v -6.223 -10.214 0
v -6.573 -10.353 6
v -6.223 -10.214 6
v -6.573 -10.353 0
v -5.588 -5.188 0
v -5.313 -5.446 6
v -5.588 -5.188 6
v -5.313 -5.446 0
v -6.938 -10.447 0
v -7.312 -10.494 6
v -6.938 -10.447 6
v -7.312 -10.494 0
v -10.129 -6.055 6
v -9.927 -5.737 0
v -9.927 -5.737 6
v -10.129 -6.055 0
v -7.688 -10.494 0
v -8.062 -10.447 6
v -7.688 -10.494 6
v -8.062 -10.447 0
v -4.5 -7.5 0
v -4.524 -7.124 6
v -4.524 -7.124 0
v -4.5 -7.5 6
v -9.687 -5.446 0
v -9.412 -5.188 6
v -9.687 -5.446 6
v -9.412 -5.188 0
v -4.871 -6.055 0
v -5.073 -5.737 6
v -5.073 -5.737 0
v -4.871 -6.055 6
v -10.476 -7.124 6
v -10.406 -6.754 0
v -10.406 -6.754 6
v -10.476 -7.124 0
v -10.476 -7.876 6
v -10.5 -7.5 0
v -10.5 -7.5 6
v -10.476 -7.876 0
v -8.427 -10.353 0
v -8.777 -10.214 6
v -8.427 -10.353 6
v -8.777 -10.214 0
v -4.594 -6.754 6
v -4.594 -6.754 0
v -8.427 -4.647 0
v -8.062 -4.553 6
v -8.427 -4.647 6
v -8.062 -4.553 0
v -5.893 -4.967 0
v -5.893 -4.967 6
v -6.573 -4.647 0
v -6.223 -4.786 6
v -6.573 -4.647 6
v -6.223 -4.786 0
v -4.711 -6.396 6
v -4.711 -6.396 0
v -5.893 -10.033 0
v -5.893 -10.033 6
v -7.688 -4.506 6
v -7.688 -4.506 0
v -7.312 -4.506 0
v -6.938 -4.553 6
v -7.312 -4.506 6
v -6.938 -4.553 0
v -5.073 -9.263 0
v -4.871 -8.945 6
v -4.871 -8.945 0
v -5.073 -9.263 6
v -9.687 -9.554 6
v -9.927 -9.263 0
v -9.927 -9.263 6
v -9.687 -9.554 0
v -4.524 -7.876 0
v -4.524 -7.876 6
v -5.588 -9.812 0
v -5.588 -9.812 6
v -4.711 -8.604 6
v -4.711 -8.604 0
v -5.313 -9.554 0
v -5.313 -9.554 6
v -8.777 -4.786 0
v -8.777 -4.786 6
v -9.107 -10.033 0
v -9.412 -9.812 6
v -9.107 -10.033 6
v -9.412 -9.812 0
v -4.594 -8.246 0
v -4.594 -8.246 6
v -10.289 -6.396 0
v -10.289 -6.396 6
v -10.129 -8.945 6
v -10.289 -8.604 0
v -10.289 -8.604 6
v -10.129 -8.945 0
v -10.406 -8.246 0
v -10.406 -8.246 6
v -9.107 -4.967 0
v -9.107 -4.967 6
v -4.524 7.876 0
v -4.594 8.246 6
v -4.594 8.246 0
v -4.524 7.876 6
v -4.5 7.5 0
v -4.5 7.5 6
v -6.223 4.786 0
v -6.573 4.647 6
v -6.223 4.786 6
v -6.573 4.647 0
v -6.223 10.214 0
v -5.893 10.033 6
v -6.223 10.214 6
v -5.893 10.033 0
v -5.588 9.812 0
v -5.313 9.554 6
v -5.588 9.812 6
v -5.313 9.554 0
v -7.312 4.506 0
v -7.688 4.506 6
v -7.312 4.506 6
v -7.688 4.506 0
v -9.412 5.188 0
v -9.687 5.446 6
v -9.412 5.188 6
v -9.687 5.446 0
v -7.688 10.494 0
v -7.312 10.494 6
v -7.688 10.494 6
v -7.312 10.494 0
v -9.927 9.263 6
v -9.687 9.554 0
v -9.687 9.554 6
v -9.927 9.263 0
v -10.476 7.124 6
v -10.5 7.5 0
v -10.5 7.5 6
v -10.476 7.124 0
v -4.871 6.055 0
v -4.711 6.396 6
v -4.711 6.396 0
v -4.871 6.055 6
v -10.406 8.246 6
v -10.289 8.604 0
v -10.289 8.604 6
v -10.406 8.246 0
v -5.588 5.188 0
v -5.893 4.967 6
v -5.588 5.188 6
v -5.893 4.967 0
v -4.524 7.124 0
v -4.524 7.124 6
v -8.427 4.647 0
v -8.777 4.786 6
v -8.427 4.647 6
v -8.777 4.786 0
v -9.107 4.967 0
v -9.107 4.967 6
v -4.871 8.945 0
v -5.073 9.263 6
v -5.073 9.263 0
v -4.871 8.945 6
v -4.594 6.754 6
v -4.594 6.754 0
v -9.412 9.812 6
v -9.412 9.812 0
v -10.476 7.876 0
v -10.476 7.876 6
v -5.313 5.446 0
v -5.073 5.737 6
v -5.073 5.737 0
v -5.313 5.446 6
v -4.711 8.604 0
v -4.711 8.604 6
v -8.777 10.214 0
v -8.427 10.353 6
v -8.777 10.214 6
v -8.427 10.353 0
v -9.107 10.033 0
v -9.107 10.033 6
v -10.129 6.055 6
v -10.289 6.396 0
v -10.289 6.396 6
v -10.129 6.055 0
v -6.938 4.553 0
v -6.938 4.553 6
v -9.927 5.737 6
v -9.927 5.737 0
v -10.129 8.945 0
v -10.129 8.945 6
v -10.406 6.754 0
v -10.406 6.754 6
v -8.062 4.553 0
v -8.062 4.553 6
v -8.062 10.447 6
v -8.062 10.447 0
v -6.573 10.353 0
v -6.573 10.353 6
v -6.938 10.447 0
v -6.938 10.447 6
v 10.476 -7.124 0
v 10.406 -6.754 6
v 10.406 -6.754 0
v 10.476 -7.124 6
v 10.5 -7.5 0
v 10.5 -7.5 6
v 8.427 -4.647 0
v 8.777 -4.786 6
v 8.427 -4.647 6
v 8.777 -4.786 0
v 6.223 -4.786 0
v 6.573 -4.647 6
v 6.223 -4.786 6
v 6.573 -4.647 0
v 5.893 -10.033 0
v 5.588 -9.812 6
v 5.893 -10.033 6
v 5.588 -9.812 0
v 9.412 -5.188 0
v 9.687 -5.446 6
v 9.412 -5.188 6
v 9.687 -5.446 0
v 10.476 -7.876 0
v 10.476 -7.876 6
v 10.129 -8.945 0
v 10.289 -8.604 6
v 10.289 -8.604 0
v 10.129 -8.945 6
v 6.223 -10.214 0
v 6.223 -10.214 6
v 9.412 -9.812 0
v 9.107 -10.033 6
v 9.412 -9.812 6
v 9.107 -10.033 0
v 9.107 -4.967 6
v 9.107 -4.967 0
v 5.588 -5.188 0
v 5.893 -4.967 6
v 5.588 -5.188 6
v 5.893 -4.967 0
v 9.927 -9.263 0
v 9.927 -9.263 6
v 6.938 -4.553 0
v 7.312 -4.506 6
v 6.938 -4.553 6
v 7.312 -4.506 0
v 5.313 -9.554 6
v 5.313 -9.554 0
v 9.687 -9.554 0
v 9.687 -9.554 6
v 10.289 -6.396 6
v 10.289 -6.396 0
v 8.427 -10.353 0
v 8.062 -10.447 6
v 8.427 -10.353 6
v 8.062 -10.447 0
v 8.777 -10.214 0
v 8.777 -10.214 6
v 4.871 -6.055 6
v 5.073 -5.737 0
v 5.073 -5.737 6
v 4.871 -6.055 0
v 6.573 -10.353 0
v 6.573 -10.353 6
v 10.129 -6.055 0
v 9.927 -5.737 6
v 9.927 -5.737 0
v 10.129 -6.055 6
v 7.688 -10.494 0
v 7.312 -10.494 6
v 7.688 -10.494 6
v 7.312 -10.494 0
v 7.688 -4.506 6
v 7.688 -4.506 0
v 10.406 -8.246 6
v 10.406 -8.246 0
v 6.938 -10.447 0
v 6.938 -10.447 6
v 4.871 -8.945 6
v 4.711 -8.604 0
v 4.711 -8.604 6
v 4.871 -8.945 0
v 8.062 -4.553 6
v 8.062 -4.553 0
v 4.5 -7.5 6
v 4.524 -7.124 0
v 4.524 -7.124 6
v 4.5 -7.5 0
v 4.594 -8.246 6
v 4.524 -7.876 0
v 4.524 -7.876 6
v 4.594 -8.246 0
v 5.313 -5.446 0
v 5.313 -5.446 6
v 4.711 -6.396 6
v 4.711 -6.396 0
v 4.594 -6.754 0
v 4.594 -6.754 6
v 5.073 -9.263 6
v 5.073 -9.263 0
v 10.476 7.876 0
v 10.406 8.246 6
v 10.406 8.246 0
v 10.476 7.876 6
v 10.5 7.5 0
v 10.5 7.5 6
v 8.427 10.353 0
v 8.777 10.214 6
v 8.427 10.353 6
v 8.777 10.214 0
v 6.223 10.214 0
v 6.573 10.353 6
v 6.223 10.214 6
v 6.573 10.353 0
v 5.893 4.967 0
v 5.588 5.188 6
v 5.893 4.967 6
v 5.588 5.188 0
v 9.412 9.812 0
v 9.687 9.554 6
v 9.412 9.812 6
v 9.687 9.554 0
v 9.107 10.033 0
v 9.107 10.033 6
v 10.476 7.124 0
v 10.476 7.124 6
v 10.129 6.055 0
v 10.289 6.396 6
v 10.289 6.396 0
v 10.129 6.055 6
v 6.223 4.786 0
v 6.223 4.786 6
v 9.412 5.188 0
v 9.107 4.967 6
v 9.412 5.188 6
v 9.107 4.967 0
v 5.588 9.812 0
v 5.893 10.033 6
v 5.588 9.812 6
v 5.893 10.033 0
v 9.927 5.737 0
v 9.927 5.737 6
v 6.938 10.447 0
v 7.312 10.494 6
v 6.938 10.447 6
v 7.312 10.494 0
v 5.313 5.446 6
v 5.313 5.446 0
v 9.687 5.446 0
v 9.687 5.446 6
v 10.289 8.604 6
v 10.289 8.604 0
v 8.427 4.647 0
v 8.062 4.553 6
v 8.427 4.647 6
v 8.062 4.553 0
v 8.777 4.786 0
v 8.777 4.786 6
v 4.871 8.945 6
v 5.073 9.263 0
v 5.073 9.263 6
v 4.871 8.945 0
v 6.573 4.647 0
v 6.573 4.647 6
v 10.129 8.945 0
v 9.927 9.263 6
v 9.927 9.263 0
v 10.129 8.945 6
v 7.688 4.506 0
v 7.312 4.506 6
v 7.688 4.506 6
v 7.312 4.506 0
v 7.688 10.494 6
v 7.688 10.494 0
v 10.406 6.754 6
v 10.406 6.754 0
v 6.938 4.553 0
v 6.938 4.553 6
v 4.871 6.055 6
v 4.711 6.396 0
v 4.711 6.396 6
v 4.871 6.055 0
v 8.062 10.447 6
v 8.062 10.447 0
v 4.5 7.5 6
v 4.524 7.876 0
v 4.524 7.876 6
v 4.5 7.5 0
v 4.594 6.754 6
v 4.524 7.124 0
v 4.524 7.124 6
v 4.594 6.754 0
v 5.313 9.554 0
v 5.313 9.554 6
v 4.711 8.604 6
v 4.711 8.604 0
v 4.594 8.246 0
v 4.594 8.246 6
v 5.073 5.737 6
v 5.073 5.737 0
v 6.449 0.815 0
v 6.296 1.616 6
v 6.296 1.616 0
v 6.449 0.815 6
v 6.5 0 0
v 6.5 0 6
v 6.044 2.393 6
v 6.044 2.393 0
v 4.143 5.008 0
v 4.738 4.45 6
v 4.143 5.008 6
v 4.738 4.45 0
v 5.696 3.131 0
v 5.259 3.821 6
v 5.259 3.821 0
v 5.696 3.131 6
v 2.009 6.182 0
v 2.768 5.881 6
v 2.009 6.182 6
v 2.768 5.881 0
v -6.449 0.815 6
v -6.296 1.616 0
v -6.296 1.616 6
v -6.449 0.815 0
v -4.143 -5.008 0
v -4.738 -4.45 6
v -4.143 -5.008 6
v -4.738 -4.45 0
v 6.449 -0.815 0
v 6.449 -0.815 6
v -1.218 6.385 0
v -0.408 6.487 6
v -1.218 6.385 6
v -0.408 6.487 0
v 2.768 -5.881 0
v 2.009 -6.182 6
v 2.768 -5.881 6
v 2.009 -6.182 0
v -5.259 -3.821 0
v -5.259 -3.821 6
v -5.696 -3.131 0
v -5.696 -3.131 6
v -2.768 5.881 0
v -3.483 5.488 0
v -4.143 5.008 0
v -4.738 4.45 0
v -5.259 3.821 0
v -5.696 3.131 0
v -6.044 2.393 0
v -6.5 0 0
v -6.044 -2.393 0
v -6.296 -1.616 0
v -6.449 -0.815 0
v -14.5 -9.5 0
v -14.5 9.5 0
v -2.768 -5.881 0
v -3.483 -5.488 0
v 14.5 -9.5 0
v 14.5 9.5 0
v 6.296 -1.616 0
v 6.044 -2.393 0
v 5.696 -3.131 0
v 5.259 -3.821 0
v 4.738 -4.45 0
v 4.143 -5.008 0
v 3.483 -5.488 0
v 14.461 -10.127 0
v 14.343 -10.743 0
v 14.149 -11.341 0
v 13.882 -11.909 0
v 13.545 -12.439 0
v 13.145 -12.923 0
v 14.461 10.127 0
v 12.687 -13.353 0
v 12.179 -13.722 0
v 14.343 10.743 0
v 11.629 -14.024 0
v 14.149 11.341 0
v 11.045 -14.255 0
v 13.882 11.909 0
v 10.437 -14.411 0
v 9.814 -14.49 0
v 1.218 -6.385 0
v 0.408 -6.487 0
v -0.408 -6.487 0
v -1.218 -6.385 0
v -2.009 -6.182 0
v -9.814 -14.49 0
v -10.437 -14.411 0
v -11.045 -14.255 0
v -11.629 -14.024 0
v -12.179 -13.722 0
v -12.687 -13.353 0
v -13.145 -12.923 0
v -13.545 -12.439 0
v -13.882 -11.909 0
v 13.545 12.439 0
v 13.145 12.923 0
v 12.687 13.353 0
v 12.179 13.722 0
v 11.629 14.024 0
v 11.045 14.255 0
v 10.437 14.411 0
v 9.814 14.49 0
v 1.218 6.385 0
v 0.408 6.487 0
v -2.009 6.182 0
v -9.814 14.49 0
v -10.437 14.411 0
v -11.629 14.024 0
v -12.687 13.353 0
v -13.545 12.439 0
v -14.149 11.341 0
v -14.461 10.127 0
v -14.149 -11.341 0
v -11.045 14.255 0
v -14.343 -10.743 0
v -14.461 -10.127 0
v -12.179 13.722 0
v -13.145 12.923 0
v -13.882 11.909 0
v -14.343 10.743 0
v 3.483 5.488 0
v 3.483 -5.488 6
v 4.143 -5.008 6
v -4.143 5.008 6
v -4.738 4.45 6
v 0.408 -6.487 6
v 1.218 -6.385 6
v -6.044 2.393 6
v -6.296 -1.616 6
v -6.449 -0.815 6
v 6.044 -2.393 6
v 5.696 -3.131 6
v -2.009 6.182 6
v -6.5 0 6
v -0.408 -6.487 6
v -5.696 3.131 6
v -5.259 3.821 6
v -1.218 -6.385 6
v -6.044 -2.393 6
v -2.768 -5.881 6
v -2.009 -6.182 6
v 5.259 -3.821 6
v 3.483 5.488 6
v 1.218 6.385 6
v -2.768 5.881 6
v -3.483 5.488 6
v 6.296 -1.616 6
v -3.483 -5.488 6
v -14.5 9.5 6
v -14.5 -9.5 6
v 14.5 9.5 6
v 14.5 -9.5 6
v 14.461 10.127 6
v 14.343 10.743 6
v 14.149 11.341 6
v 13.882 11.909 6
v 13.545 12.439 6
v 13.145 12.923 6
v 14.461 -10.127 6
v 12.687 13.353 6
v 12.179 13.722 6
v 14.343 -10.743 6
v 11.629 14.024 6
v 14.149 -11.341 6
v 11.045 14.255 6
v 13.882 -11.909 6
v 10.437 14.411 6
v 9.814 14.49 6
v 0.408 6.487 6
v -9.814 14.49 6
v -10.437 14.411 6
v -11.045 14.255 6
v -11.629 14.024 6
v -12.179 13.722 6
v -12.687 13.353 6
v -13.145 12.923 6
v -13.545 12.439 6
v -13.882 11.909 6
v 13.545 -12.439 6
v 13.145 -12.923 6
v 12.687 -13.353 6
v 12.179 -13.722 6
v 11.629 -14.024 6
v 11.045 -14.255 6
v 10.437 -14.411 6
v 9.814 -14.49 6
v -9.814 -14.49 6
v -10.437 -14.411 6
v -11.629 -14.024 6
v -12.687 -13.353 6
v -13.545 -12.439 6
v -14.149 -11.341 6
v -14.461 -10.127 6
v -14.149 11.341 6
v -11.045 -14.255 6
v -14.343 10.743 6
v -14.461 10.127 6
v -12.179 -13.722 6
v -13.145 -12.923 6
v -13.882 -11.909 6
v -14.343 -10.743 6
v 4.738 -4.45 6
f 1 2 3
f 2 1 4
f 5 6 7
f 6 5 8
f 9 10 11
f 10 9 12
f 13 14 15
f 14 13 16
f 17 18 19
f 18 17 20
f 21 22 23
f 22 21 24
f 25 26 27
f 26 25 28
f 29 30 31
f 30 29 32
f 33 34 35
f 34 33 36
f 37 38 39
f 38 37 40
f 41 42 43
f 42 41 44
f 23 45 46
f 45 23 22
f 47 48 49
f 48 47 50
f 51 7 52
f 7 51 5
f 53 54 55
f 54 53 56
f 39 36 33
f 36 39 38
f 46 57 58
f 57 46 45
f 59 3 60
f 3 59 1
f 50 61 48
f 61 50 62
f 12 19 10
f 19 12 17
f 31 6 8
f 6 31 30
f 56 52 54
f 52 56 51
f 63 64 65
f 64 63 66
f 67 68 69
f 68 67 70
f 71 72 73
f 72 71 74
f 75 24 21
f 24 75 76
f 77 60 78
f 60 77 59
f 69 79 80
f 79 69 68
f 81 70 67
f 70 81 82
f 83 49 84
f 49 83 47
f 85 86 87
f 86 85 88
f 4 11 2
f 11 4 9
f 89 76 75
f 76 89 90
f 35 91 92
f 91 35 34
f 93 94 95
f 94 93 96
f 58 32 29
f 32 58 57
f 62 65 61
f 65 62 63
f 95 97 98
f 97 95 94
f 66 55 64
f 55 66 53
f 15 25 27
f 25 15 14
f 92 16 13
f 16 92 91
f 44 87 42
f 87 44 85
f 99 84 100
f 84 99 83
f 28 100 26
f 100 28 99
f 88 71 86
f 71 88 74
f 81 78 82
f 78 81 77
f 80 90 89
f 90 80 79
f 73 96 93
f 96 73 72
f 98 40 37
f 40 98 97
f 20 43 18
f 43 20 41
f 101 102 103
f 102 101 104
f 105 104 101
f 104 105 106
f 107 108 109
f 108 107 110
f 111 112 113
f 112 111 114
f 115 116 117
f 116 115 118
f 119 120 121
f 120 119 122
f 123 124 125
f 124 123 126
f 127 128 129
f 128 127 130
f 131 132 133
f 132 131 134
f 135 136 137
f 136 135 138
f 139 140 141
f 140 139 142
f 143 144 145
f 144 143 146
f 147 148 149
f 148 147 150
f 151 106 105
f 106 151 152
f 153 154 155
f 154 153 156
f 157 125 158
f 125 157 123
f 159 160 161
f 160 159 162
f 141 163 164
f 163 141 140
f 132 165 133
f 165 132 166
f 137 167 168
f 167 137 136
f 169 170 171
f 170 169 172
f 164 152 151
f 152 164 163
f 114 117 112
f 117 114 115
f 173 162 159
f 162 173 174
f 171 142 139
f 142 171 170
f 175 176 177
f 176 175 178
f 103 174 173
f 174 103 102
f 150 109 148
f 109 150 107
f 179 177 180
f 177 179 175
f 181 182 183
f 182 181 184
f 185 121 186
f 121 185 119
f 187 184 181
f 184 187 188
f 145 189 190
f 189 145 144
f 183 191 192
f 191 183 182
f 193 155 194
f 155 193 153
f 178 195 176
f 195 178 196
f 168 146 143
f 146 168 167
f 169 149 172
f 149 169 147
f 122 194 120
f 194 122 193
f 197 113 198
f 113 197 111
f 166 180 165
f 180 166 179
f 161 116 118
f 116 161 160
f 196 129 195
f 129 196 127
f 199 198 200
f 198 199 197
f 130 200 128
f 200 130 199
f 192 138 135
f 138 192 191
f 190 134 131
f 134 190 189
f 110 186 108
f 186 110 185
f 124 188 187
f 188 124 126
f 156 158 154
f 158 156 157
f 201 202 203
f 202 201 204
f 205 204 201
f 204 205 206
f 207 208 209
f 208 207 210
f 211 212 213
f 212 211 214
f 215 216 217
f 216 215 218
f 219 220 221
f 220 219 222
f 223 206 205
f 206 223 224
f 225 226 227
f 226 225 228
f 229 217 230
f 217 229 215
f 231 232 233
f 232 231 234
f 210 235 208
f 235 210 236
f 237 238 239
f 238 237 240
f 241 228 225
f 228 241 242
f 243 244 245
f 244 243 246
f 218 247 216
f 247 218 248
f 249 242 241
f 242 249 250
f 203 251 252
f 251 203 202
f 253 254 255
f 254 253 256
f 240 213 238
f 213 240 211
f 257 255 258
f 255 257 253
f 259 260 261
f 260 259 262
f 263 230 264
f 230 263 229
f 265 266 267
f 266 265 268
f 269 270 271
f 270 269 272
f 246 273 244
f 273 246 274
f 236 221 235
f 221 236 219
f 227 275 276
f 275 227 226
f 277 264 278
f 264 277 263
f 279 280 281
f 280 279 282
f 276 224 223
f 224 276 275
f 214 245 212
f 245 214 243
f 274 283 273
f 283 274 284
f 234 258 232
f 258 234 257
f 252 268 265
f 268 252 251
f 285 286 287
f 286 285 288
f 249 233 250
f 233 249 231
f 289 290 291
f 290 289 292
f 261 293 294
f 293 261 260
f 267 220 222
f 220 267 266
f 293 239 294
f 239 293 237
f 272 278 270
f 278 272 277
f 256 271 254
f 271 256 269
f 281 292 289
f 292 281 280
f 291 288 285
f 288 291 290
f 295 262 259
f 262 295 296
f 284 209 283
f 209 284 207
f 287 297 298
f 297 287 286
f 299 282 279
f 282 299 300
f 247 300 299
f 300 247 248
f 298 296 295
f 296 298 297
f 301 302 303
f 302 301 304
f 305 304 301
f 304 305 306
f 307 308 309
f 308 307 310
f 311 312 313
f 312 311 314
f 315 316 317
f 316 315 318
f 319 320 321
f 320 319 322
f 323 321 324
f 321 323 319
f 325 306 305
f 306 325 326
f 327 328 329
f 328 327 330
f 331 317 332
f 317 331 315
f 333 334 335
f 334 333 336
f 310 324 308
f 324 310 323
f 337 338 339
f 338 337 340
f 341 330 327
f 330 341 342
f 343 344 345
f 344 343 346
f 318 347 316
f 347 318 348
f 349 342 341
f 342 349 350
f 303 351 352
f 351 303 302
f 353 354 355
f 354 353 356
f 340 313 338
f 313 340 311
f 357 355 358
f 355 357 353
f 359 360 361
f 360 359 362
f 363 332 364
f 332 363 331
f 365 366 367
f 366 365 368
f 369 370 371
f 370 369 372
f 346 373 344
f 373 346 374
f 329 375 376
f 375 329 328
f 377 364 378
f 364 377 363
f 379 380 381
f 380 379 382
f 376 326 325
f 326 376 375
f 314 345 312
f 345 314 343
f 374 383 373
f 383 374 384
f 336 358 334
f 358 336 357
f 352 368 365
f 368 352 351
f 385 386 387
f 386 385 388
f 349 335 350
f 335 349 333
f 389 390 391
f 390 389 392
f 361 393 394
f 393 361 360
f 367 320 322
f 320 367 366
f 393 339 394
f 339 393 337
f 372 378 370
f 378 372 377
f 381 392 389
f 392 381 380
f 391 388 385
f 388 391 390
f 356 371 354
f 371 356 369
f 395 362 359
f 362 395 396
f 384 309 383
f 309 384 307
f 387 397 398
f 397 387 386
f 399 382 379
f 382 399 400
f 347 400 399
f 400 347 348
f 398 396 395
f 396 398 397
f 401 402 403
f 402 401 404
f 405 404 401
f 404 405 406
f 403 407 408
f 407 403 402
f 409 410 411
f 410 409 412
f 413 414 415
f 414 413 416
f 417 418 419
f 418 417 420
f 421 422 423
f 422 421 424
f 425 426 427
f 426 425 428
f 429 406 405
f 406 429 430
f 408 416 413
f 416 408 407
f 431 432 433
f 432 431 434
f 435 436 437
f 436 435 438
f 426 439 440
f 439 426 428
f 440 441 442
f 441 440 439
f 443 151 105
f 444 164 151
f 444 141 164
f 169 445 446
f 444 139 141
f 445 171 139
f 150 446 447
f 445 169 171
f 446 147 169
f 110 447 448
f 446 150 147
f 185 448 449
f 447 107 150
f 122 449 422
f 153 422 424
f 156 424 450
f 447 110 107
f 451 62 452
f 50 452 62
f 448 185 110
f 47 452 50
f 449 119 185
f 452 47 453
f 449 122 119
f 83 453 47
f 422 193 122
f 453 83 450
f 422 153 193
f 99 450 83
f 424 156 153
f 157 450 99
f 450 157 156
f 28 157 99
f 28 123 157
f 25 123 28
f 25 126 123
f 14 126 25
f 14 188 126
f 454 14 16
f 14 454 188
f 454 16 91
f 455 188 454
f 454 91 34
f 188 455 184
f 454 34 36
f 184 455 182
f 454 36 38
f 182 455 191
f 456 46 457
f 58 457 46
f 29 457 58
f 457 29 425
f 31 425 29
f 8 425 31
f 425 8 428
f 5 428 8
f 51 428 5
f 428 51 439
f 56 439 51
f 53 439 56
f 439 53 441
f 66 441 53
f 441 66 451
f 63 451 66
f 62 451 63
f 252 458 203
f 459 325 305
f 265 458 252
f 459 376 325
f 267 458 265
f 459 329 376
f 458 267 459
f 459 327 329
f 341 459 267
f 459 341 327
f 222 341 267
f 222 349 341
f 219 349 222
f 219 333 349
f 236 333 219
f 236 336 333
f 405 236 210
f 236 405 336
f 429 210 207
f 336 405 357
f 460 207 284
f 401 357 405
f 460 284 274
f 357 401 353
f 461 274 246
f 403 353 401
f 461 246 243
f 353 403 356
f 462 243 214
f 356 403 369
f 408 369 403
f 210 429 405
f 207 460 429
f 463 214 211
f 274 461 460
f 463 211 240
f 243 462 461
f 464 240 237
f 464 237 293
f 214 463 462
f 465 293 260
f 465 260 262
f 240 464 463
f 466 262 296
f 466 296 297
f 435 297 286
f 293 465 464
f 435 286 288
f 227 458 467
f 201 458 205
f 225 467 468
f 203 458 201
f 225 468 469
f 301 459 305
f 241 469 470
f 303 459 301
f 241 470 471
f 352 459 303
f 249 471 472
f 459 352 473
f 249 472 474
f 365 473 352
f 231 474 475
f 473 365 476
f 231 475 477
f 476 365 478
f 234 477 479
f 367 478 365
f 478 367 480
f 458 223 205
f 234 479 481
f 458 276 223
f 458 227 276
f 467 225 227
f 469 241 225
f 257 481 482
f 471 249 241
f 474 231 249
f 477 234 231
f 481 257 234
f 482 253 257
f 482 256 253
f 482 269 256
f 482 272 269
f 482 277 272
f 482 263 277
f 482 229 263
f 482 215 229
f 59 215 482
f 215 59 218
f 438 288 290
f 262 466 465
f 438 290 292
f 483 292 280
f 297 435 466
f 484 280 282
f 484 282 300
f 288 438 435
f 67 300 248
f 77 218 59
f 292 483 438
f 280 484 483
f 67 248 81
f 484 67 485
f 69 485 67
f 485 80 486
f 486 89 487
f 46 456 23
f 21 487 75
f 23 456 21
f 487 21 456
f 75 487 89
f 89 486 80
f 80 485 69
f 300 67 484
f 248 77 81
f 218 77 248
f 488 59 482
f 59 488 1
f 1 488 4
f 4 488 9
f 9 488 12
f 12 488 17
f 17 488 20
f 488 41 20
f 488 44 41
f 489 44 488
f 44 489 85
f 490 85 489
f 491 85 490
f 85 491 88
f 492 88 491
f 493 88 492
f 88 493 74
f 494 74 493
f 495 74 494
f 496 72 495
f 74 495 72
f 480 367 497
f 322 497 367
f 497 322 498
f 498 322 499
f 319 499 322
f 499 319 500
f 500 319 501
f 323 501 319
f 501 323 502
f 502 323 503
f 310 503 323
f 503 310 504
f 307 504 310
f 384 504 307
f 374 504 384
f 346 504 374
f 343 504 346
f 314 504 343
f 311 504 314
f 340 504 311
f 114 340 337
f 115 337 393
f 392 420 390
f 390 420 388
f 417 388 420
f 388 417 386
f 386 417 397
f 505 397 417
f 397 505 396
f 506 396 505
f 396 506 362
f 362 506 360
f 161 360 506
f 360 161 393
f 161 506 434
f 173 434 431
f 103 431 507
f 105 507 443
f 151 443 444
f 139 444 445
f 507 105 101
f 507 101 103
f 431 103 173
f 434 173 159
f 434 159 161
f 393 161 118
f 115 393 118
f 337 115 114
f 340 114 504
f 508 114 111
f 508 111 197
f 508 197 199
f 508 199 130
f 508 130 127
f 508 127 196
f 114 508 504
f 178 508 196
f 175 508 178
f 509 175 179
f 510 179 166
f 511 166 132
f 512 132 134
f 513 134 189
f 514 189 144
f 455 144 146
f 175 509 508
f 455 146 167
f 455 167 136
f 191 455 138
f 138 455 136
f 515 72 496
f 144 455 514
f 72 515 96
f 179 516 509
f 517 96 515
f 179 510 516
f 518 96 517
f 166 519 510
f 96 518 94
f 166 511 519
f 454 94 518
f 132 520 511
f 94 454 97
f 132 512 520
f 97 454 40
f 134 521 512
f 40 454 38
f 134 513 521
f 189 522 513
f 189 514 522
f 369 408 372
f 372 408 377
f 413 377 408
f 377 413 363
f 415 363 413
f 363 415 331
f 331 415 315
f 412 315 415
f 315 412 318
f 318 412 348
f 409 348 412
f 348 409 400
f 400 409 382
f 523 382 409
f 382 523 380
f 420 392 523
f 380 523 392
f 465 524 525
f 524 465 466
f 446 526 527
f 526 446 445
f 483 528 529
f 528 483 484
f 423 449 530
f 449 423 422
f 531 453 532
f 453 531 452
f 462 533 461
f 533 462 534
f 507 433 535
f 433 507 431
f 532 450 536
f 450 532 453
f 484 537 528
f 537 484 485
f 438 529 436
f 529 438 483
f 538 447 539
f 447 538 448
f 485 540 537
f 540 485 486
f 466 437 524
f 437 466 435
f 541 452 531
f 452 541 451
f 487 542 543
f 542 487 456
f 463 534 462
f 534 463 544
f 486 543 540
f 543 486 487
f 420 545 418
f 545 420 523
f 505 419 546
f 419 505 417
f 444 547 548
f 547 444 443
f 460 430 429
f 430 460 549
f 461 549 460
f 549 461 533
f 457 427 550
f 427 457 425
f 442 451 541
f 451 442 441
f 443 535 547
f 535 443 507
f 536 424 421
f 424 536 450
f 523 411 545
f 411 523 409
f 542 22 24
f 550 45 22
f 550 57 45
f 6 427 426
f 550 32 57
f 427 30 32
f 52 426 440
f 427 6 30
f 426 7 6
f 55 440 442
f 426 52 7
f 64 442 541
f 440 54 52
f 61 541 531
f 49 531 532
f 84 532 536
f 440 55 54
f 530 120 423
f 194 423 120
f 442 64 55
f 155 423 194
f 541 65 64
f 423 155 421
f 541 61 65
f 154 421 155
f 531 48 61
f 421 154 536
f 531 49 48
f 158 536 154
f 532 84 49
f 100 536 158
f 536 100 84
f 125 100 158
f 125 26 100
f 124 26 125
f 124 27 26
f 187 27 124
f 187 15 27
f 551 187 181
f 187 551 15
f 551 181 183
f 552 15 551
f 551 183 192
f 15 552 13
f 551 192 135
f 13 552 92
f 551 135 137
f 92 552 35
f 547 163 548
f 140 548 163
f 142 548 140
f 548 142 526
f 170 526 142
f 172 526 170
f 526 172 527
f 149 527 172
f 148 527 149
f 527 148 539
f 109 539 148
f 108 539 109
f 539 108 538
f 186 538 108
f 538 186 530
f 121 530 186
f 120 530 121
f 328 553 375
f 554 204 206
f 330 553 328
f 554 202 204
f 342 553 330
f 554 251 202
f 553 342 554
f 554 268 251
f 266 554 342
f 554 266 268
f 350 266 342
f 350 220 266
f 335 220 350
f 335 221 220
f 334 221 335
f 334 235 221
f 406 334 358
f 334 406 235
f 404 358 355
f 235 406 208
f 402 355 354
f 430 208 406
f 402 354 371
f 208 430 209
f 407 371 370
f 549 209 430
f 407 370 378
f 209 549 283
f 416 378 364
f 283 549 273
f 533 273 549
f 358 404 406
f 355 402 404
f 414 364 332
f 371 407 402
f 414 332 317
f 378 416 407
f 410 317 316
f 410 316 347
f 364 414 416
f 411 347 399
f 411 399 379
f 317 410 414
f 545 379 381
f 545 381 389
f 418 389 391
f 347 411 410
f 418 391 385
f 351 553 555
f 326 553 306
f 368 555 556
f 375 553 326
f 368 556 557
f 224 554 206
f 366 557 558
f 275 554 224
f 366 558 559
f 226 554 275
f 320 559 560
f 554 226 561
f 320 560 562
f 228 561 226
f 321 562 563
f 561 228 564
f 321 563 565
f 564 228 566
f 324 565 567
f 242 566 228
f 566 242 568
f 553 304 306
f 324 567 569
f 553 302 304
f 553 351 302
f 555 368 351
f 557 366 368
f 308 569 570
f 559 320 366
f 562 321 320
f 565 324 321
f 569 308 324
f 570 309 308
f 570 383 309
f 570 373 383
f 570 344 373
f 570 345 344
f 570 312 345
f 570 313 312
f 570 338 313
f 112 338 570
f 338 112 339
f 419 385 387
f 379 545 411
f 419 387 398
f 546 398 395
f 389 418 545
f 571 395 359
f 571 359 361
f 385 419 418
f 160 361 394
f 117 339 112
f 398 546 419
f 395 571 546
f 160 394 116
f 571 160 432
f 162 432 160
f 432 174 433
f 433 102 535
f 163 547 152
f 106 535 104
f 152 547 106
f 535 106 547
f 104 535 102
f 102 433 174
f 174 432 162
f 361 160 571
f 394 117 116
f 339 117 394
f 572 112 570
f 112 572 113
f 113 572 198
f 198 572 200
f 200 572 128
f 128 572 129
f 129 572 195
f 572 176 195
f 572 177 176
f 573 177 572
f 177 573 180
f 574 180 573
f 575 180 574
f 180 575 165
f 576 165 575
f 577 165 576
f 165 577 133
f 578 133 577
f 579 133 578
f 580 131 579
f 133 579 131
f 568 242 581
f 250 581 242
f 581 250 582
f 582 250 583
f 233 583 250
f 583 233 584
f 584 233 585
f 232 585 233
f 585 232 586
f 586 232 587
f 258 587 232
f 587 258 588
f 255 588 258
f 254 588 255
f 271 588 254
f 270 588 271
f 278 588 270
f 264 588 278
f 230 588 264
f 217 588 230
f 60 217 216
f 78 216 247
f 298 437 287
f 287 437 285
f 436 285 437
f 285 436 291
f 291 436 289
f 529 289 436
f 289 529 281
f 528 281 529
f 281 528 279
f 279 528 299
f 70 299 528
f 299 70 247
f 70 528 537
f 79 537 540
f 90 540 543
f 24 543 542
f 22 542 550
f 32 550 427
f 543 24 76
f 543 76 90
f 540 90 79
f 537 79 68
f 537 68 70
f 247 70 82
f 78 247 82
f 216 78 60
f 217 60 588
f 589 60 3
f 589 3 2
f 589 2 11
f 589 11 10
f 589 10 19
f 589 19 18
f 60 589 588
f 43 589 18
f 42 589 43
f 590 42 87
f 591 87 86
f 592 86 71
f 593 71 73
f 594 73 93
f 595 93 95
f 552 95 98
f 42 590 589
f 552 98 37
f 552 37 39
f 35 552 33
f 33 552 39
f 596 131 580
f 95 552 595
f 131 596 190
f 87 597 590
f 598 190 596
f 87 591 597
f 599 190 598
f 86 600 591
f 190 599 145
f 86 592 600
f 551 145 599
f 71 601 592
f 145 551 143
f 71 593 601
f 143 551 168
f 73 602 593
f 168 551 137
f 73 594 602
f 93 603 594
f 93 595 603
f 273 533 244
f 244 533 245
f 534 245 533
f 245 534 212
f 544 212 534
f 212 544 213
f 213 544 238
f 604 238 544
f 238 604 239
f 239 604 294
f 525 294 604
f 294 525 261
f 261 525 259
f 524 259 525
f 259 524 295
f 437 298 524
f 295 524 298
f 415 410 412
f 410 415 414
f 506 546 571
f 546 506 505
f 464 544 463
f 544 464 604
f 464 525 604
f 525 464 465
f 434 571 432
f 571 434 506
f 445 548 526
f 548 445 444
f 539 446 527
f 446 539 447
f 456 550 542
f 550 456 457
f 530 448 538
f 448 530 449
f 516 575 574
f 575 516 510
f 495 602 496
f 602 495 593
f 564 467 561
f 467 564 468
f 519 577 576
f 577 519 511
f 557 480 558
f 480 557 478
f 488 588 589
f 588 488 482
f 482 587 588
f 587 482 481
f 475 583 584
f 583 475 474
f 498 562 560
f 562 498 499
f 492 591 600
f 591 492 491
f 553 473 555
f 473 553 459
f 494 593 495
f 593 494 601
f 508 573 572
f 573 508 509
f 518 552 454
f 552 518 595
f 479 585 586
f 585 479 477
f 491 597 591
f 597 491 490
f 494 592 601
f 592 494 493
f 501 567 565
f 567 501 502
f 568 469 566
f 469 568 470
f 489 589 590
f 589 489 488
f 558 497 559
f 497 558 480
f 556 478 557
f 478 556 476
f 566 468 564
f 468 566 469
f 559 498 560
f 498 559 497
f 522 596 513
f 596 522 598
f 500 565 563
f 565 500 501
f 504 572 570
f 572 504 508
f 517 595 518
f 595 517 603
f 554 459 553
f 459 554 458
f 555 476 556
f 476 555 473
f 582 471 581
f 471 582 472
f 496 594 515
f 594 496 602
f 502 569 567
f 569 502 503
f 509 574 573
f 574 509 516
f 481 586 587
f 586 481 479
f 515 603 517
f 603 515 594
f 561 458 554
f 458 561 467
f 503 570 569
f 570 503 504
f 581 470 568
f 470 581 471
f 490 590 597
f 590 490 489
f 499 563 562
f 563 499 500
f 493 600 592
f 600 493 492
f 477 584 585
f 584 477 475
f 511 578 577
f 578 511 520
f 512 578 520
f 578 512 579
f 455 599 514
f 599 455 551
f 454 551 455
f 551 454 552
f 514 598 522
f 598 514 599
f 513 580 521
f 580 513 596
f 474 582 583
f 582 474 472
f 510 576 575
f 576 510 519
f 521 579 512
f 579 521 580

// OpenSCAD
$fn = 50;


difference() {
	union() {
		hull() {
			translate(v = [-9.5000000000, 9.5000000000, 0]) {
				cylinder(h = 6, r = 5);
			}
			translate(v = [9.5000000000, 9.5000000000, 0]) {
				cylinder(h = 6, r = 5);
			}
			translate(v = [-9.5000000000, -9.5000000000, 0]) {
				cylinder(h = 6, r = 5);
			}
			translate(v = [9.5000000000, -9.5000000000, 0]) {
				cylinder(h = 6, r = 5);
			}
		}
	}
	union() {
		#translate(v = [-7.5000000000, -7.5000000000, -100.0000000000]) {
			cylinder(h = 200, r = 3.0000000000);
		}
		#translate(v = [-7.5000000000, 7.5000000000, -100.0000000000]) {
			cylinder(h = 200, r = 3.0000000000);
		}
		#translate(v = [7.5000000000, -7.5000000000, -100.0000000000]) {
			cylinder(h = 200, r = 3.0000000000);
		}
		#translate(v = [7.5000000000, 7.5000000000, -100.0000000000]) {
			cylinder(h = 200, r = 3.0000000000);
		}
		#cylinder(h = 6, r = 6.5000000000);
	}
}
